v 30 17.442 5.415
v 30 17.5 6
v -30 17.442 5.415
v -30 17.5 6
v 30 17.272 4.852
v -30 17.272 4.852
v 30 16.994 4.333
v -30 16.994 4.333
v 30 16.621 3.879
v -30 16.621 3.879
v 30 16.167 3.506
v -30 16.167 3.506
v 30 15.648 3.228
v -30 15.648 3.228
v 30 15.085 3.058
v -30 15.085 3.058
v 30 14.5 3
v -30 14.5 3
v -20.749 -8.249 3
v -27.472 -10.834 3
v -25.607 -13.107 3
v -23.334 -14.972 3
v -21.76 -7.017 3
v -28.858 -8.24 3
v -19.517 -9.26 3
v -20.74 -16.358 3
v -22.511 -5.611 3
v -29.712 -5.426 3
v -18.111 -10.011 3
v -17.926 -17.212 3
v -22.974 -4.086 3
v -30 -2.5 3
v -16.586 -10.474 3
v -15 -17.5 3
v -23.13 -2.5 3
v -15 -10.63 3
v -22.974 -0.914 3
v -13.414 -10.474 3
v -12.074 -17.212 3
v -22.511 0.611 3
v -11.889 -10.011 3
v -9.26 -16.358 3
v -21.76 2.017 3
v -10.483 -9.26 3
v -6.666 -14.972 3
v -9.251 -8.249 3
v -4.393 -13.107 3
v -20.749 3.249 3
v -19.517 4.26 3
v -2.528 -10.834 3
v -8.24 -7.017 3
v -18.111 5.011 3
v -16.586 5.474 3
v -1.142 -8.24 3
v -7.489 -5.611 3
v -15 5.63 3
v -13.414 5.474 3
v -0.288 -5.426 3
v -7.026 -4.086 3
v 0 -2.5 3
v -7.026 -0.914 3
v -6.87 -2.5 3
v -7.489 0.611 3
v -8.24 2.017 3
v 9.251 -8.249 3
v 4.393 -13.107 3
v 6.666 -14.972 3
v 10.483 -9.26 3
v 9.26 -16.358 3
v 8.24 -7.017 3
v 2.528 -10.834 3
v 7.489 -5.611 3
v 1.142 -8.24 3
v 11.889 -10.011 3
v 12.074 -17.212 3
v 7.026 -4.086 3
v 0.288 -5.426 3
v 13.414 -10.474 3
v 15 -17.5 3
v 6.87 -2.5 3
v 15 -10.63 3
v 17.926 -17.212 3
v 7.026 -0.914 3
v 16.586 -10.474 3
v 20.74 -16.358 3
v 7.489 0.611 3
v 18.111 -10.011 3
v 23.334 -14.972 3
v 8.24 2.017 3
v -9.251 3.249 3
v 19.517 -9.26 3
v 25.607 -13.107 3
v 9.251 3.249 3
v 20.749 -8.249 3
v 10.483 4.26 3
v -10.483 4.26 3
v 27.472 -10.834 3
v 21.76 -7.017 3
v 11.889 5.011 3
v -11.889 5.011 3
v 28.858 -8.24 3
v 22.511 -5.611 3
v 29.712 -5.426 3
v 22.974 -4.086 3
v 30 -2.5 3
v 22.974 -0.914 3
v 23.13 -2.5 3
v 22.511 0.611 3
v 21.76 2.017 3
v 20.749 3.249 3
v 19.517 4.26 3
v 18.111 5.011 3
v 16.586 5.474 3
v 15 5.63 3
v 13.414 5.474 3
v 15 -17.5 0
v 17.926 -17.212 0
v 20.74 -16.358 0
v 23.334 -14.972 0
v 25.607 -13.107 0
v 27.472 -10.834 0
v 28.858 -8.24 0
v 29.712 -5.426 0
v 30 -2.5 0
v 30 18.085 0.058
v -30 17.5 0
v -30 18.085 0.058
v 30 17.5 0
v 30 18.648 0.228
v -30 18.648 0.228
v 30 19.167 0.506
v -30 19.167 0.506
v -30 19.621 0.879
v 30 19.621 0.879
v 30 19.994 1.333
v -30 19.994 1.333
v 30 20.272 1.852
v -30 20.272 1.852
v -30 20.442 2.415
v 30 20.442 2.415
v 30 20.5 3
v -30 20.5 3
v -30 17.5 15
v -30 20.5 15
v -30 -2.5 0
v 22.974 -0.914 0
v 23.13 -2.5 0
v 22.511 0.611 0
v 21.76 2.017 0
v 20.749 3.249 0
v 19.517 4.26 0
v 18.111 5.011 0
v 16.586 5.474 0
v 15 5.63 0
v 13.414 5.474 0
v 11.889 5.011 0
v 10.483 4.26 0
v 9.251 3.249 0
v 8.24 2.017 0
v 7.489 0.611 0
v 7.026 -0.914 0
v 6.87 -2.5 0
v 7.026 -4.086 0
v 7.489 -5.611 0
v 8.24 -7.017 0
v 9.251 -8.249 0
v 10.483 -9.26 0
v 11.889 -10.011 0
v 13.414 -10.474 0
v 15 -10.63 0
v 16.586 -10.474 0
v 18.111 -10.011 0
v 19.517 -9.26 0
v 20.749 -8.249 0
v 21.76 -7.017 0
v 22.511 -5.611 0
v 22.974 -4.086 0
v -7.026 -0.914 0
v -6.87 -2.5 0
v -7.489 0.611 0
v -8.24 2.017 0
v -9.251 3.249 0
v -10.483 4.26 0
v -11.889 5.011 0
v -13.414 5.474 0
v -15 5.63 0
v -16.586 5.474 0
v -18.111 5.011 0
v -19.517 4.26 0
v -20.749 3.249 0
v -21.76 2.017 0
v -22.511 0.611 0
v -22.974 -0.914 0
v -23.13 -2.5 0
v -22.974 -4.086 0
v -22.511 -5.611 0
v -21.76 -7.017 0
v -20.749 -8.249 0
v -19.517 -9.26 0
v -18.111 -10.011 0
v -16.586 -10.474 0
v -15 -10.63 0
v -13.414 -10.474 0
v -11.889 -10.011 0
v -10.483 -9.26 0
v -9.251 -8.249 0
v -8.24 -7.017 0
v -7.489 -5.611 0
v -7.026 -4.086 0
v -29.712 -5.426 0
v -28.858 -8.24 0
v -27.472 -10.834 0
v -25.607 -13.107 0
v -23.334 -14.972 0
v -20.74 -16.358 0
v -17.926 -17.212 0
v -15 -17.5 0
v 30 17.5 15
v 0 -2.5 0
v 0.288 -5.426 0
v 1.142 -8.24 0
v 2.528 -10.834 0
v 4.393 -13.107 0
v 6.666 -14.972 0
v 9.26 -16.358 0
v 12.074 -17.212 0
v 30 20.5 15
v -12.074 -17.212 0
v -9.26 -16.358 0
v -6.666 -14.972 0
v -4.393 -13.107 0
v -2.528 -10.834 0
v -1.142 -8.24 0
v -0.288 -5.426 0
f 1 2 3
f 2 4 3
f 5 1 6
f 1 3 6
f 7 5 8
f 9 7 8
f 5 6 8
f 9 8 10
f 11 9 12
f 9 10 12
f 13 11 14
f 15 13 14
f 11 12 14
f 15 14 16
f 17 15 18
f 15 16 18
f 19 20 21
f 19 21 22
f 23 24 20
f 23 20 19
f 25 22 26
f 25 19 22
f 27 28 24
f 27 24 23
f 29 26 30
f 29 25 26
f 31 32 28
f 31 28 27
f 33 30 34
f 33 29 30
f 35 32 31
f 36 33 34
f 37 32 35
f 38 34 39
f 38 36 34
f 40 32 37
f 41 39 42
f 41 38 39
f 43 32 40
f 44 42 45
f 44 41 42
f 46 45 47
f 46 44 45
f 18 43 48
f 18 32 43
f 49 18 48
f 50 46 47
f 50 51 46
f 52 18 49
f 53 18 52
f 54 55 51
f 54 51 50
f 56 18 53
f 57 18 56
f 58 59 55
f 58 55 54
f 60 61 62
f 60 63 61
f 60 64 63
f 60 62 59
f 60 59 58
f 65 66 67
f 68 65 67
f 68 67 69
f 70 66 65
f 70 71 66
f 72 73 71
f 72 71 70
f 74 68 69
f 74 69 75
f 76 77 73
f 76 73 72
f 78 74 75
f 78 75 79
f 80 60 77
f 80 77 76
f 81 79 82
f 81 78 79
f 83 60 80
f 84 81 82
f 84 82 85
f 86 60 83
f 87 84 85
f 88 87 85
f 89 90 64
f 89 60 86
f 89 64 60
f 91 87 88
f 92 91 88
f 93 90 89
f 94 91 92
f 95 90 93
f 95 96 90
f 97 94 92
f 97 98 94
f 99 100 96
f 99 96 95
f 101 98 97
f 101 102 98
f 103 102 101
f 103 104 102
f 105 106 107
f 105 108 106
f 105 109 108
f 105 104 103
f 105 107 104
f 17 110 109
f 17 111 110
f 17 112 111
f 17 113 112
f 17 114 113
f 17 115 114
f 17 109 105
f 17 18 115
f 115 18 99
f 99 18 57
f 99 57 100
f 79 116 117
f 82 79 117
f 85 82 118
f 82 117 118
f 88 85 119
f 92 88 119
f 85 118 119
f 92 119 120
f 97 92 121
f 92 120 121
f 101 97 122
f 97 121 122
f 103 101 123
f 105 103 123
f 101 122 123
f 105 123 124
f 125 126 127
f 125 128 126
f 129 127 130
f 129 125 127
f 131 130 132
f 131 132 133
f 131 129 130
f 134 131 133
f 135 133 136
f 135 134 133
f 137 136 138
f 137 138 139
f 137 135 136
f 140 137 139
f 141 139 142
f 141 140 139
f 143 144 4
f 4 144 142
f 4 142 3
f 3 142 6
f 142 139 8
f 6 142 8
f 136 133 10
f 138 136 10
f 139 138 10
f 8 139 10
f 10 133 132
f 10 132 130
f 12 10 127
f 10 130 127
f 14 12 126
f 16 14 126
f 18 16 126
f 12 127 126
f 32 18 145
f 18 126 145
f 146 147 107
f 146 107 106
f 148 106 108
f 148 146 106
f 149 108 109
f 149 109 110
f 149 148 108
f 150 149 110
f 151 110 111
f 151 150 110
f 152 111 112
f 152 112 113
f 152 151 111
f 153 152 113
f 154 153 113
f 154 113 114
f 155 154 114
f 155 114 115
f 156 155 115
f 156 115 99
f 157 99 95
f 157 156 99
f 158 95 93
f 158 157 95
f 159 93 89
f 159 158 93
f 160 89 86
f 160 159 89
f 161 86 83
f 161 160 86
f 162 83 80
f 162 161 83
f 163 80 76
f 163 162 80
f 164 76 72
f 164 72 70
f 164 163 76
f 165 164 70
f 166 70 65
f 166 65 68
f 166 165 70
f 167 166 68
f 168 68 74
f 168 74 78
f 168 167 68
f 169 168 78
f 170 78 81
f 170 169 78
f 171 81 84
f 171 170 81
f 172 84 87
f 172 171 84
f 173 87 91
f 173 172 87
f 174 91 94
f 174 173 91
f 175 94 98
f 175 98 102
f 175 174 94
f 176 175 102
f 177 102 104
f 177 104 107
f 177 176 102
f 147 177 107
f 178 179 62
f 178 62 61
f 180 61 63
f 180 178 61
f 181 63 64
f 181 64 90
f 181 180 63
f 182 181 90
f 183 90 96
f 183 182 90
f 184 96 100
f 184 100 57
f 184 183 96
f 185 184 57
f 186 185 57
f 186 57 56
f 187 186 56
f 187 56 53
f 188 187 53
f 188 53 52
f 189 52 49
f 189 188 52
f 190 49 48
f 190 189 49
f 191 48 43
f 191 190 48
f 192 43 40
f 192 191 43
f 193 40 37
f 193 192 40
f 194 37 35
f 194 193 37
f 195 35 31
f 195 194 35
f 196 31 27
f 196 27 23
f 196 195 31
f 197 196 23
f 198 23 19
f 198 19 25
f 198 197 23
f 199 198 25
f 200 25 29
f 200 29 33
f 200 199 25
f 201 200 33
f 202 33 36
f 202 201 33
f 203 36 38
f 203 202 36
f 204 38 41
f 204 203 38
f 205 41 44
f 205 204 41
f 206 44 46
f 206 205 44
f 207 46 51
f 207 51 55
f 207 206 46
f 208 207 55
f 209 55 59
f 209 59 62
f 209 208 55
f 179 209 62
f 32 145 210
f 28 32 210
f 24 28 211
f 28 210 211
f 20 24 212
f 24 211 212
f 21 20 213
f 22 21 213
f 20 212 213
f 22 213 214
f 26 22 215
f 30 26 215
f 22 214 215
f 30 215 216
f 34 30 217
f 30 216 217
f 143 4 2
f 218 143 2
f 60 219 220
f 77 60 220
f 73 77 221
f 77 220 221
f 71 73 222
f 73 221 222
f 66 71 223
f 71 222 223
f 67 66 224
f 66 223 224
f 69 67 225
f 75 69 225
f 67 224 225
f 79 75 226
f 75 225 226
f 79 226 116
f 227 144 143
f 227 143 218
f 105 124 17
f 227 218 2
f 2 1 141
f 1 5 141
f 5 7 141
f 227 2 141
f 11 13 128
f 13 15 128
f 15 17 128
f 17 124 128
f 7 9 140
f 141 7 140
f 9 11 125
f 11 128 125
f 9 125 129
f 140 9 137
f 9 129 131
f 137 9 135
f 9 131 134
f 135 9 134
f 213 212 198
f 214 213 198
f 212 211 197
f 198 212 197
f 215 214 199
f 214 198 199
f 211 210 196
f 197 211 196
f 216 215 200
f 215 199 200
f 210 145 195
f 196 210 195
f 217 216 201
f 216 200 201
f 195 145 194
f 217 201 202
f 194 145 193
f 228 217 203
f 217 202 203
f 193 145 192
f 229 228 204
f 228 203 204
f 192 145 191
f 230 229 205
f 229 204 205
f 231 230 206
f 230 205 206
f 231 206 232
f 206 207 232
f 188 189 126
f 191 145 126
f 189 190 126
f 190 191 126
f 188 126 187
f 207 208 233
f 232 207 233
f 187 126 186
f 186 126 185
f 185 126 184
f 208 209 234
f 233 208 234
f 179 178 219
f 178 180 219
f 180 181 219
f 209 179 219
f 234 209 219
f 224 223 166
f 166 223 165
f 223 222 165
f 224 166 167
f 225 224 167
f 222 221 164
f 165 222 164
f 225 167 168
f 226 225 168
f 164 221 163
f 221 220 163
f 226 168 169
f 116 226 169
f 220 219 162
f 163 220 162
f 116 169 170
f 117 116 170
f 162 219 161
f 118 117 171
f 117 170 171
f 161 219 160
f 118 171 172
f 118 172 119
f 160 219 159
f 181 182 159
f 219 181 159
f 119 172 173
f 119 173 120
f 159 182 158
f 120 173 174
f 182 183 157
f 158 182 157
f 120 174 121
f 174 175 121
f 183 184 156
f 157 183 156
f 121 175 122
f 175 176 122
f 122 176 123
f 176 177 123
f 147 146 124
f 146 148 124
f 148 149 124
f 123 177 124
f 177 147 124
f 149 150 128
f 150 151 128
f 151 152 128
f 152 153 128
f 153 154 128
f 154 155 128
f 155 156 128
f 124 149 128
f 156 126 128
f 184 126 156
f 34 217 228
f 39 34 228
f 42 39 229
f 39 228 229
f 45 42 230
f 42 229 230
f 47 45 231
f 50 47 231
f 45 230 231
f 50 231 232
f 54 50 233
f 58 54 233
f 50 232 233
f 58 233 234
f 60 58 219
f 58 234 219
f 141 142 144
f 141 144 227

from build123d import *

# Parameters (mm, degrees)
SKETCH1_W           = 60
SKETCH1_H           = 3
BOSS_EXTRUDE2_DEPTH = 15
SKETCH1_5_R         = 8.13
BOSS_EXTRUDE3_DEPTH = 3
FILLET1_R           = 3
FILLET2_R           = 3


with BuildPart() as part:
    # Sketch1 → Boss-Extrude2 (new body)
    with BuildSketch(Plane.XY):
        with Locations((0, 19)):
            Rectangle(SKETCH1_W, SKETCH1_H)
    extrude(amount=BOSS_EXTRUDE2_DEPTH)

    # Sketch1<5> → Boss-Extrude3 (add)
    with BuildSketch(Plane.XY):
        with BuildLine():
            Line((30, 17.5), (-30, 17.5))
            Line((-30, 17.5), (-30, -2.5))
            ThreePointArc((-30, -2.5), (-25.606601718, -13.106601718), (-15, -17.5))
            ThreePointArc((-15, -17.5), (-4.393398282, -13.106601718), (0, -2.5))
            ThreePointArc((0, -2.5), (4.39339828, -13.106601715), (14.999999993, -17.5))
            ThreePointArc((14.999999993, -17.5), (25.606601715, -13.10660172), (30, -2.5))
            Line((30, -2.5), (30, 17.5))
        make_face()
        with Locations((-15, -2.5)):
            Circle(SKETCH1_5_R, mode=Mode.SUBTRACT)
        with Locations((15, -2.5)):
            Circle(SKETCH1_5_R, mode=Mode.SUBTRACT)
    extrude(amount=BOSS_EXTRUDE3_DEPTH)

    # Fillet1
    fillet1_edges = [part.edges().sort_by_distance(p)[0] for p in [
        (0, 17.5, 3),
    ]]
    fillet(fillet1_edges, radius=FILLET1_R)

    # Fillet2
    fillet2_edges = [part.edges().sort_by_distance(p)[0] for p in [
        (0, 20.5, 0),
    ]]
    fillet(fillet2_edges, radius=FILLET2_R)


solid = part.part
